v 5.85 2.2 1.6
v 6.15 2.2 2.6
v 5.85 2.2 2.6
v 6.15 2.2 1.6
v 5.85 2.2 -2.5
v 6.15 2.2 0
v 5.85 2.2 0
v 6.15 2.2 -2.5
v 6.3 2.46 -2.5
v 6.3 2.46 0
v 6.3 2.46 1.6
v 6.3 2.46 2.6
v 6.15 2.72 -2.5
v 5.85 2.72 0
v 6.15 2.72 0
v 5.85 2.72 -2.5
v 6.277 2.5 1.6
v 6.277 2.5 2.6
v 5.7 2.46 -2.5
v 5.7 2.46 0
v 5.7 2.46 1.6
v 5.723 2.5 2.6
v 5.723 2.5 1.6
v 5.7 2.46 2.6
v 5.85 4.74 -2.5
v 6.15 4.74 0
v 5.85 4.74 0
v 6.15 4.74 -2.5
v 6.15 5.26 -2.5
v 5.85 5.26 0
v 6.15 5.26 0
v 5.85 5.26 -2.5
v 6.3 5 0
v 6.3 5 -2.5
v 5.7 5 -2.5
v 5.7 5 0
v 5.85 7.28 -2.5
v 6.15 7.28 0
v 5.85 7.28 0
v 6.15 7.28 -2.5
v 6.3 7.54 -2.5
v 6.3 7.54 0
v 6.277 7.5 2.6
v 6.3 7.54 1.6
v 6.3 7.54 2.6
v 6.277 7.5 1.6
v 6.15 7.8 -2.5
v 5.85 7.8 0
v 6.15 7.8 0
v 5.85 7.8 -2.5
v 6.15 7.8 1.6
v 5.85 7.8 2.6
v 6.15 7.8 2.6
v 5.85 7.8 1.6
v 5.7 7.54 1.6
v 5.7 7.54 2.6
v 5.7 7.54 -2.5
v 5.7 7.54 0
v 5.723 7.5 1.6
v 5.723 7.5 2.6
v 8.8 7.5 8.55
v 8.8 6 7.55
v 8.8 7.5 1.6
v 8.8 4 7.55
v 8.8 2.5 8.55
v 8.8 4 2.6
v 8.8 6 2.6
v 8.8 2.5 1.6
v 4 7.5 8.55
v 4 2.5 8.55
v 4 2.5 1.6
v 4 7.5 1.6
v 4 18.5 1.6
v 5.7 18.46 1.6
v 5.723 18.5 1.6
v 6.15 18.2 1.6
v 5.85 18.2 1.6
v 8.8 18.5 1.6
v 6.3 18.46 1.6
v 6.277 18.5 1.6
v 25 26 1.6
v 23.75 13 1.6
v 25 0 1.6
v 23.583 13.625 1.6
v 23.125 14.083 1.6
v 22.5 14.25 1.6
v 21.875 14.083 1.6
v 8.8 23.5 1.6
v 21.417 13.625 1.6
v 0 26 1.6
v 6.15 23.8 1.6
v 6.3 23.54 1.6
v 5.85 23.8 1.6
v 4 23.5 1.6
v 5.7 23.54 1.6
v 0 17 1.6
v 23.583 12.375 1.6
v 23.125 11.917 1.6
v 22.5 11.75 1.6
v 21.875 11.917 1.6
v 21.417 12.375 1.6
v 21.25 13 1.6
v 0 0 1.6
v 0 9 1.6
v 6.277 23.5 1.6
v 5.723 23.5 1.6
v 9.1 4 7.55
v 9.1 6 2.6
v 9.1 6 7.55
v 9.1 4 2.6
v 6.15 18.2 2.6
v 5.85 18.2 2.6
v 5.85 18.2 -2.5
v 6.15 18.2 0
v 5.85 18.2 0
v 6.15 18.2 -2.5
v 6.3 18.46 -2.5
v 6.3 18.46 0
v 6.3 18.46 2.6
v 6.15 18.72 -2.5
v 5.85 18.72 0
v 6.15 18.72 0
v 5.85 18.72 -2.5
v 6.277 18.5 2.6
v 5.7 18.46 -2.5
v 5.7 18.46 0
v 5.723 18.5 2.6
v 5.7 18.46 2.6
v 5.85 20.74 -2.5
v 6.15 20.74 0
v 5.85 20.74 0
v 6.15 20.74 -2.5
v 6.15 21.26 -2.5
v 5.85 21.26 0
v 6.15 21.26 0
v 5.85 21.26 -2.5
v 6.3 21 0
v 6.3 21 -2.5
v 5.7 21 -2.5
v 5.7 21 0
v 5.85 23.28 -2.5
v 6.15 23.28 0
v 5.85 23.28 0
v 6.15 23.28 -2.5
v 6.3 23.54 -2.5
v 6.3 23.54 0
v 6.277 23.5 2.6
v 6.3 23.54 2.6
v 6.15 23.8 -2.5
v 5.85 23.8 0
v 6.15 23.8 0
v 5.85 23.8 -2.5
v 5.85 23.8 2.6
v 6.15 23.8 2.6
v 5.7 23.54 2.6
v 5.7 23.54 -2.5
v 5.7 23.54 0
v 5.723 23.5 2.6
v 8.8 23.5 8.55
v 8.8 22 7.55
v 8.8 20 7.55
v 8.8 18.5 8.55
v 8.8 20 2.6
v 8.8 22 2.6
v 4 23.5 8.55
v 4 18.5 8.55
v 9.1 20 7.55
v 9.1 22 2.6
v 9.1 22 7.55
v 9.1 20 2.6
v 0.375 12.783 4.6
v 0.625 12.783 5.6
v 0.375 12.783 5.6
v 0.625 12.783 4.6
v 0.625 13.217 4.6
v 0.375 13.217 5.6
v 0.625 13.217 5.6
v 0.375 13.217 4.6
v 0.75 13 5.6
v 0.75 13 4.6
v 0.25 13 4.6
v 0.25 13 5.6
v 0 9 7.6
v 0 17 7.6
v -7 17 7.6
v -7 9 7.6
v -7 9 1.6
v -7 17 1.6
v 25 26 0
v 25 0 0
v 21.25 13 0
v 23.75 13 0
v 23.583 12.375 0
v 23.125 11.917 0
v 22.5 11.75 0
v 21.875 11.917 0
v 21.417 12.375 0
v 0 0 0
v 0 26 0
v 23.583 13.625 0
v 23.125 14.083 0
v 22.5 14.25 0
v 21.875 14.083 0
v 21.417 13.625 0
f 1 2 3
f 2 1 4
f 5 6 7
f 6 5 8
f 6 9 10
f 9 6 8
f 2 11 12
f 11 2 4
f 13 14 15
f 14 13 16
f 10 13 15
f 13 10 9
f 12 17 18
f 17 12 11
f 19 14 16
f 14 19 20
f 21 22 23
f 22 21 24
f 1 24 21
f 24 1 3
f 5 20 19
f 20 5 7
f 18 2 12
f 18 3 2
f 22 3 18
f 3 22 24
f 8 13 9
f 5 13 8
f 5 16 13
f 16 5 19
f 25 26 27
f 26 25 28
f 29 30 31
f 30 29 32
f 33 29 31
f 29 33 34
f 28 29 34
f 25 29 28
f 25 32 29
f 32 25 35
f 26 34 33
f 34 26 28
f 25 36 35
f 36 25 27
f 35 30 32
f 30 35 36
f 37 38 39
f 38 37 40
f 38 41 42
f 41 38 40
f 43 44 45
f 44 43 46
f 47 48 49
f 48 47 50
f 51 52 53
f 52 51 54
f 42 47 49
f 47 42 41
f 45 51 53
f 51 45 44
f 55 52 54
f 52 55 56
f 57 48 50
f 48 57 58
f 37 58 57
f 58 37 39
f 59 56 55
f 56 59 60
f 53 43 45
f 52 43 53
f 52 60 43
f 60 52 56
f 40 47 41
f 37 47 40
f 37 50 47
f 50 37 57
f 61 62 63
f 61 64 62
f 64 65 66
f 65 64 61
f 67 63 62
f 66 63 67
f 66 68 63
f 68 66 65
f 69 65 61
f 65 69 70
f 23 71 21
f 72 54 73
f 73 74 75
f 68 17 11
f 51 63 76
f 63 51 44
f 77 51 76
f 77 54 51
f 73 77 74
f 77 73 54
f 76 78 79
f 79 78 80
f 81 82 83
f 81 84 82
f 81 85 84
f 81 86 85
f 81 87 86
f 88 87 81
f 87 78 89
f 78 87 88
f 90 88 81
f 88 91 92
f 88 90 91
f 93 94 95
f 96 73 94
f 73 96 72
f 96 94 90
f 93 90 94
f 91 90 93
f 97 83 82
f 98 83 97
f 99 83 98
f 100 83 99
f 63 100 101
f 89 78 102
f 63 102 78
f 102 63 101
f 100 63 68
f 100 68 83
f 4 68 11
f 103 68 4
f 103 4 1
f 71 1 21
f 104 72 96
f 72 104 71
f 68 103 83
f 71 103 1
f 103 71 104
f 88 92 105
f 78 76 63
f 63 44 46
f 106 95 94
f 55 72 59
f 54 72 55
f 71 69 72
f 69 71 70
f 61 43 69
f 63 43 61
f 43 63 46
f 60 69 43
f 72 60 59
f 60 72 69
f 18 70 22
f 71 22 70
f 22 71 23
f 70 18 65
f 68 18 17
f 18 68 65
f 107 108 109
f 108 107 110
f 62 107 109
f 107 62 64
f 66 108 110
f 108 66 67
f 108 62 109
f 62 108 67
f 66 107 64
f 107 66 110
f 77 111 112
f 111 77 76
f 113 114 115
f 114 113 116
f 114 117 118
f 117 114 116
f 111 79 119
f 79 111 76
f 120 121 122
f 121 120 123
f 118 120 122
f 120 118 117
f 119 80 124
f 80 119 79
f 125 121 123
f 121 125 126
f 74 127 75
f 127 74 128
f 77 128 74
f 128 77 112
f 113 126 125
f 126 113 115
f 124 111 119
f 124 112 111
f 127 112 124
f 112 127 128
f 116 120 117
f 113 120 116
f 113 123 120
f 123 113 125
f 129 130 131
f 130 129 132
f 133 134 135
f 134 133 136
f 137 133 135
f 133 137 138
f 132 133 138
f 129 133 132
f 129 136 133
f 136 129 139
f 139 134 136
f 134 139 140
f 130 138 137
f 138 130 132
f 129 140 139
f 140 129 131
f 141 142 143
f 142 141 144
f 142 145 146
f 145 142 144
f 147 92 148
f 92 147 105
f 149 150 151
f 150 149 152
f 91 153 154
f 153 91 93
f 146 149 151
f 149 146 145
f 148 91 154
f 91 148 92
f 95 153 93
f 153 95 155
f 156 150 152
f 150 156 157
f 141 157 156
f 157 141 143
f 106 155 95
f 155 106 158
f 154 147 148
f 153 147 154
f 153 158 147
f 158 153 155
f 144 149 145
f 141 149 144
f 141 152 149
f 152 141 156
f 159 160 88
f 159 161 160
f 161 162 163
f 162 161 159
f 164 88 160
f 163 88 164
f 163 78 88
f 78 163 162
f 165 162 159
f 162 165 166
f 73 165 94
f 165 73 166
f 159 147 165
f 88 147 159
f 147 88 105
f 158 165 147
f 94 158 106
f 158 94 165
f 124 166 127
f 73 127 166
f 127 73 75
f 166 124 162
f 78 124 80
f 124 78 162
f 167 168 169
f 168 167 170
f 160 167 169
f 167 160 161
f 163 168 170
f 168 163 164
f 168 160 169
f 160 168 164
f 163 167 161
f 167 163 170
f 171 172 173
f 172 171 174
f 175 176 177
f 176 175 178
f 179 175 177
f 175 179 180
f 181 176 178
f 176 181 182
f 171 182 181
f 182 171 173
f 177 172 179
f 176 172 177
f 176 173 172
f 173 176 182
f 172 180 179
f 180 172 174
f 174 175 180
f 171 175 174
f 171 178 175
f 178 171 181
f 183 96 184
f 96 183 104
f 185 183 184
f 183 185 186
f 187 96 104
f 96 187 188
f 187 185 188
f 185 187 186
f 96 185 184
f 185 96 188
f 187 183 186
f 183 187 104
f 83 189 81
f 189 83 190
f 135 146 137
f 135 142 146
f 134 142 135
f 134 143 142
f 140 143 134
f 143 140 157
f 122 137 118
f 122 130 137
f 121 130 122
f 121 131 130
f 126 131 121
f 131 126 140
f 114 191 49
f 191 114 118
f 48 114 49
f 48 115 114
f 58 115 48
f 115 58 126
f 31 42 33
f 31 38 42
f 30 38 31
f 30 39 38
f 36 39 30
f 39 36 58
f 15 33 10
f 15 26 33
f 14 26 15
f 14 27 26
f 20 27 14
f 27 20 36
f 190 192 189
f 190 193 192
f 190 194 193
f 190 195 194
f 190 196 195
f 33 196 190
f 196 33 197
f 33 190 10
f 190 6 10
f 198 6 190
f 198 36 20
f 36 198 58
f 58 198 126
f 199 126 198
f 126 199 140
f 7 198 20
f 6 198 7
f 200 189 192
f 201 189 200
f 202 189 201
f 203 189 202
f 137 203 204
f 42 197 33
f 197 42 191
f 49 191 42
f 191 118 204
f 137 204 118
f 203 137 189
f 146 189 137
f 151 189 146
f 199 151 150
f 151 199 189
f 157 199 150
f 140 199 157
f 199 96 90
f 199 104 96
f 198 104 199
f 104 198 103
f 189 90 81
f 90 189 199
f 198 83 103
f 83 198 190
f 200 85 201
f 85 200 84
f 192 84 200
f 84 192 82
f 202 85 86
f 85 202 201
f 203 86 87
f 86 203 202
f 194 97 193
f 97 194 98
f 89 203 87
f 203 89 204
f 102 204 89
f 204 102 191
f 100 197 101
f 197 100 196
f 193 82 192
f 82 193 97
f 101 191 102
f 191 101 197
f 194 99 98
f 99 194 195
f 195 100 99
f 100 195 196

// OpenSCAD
// Dock Homing Sensor PCB — 2x TSOP38238 IR Receivers
// BOM (upstream BOM.md line 57): "Dock homing sensor | 1 | $3 | Custom PCB |
// 2x TSOP38238 IR receivers"
//
// Function: robot-side receiver board for the final dock-approach/centering
// step. The DOCK board carries an "IR homing beacon" (BOM.md line 81, Dock
// board feature). The robot's TWO TSOP38238 receivers detect that beacon and
// the pair gives lateral (left/right) signal-parity information so the MCU can
// steer the robot onto the charge contacts. This model carries NO IR LED —
// the dock emits, the robot receives. (Function reasoning: (estimate) inferred
// from BOM lines 57 + 81; verify intended firmware use.)
//
// TSOP38238 envelope is (datasheet: Vishay TSOP382/384 datasheet, rev 2.1,
// 27-May-2025, Doc. 82491, fetched 2026-08-15): Minicast package
// "5.0 W x 6.95 H x 4.8 D" mm, leads 2.54 mm nominal pitch, overall length
// with leads 8.25 ± 0.3 mm, pinning 1 = OUT, 2 = GND, 3 = VS, carrier 38 kHz,
// half-angle half transmission distance φ1/2 = ±45 °.
//
// Everything PCB-outline and layout related below is (estimate) — this is a
// custom PCB, not an off-the-shelf module.
//
// Licensed CC0 — use freely.

// ===== PARAMETERS =====

// ---- Custom PCB (estimate, conjectural layout) ----
pcb_l      =  25;   // mm (estimate) board length along boresight (dock-facing edge ⇒ rear edge)
pcb_w      =  26;   // mm (estimate) board width across the robot (cross-axis); sized to
                    //   contain the receiver pair + margins (2 x tsop_w + rx_pitch + edges)
pcb_thick  =   1.6; // mm (estimate) standard FR4, verify with Jig 16 feeler steps

// ---- TSOP38238 (datasheet: Vishay TSOP382/384, Doc 82491, fetched 2026-08-15) ----
tsop_w     =   5.0; // mm (datasheet) package W
tsop_d     =   4.8; // mm (datasheet) package D (depth along boresight)
tsop_h     =   6.95; // mm (datasheet) package H total (leaded Minicast; overall w/ leads 8.25 ± 0.3)
tsop_pins  =   3;   // (datasheet) pinning 1 = OUT, 2 = GND, 3 = VS
tsop_pin_pitch = 2.54; // mm (datasheet) lead pitch "2.54 nom."

// ---- Receiver pair geometry (estimate — THE critical docking dimension) ----
rx_pitch   =  16;   // mm (estimate) center-to-center spacing of the two TSOP38238.
                    // Sets the lateral centering geometry vs. the dock beacon.
                    // Constraints: ≤ dock beacon beam width at approach; ≥ PCB
                    // space for two full packages + leads. MUST be re-derived
                    // from the actual dock/IR design and beam test.
rx_inset   =   4;   // mm (estimate) first receiver center from board front edge

// ---- Mounting / connector (estimate) ----
mtg_dia    =   2.5; // mm (estimate) M2 screw clearance
mtg_inset  =   2.5; // mm (estimate) mount hole center from rear board edge
conn_pins  =   4;   // (estimate) VCC, GND, OUT_beam1, OUT_beam2 (2 receivers share supply)
conn_pitch =   2.0; // mm (estimate) JST PH 2.0 mm or similar
conn_w     =   8;   // mm (estimate) connector shell width
conn_d     =   7;   // mm (estimate) connector shell depth
conn_h     =   6;   // mm (estimate) connector shell height above PCB

$fn = 16;

// ===== MODULES =====

module pcb() {
    color("DarkGreen", 0.85) cube([pcb_l, pcb_w, pcb_thick]);
}

module tsop38238(at_y = 0) {
    // Dash-mounted IR receiver module. Window faces +X (toward the dock).
    color("DimGray") {
        translate([rx_inset, at_y - tsop_w/2, pcb_thick])
            cube([tsop_d, tsop_w, tsop_h]);
        // IR window on the +X (boresight) face, capped on both sides by case
        color("DarkRed", 0.6)
            translate([rx_inset + tsop_d, at_y - 1.0, pcb_thick + 1.0])
                cube([0.3, 2.0, tsop_h - 2.0]);
        // 3 leads (1=OUT,2=GND,3=VS) down through the PCB, 2.54 pitch
        for (i = [0 : tsop_pins - 1]) {
            translate([rx_inset + 2, at_y + (i - 1) * tsop_pin_pitch, -2.5])
                cylinder(h = pcb_thick + 2.5 + 1, d = 0.6, $fn = 6);
        }
    }
}

module connector() {
    // 4-pin JST PH or similar on the rear (-X) edge
    color("White") {
        translate([-conn_d, pcb_w/2 - conn_w/2, pcb_thick])
            cube([conn_d, conn_w, conn_h]);
        for (i = [0 : conn_pins - 1]) {
            translate([-conn_d + 1.5 + i * conn_pitch, pcb_w/2, pcb_thick + conn_h/2])
                cylinder(h = 1, d = 0.5, $fn = 6);
        }
    }
}

module mounting_holes() {
    // 2 rear mount holes (M2) on the board centreline
    for (x = [pcb_l - mtg_inset])
        for (y = [pcb_w/2])
            translate([x, y, -0.1])
                cylinder(h = pcb_thick + 0.2, d = mtg_dia, $fn = 12);
}

module assembly() {
    difference() {
        union() {
            pcb();
            tsop38238( at_y =  pcb_w/2 - rx_pitch/2);
            tsop38238( at_y =  pcb_w/2 + rx_pitch/2);
            connector();
        }
        mounting_holes();
    }
}

// ===== RENDER =====
assembly();

// ===== NOTES =====
// (1) BOM hierarchy: the two TSOP38238 are the ONLY compass co-located with
//     this board (BOM L57). The dock emits a homing beacon (BOM L81); both
//     receivers point +X and are spaced rx_pitch apart so centered access sees
//     equal irradiance and off-center approach creates a left/right imbalance
//     (φ1/2 = ±45° per datasheet gives each receiver a wide acceptance cone —
//     verify actual beacon geometry).
//
// (2) rx_pitch is the single most important number on this board (like
//     contact_pitch on the charging contacts). It sets how precisely the robot
//     can square to the dock. If firmware uses only "beacon seen / not seen",
//     spacing only needs to clear the charge contact pitch (45 mm est) gap so a
//     receiver is always within the beacon cone; if firmware steers on signal
//     parity, wider spacing = sharper centering but a narrower capture window.
//     Re-derive it from the dock IR design, don't trust this 16 mm estimate.
//
// (3) No IR LED on this board — the dock beacon (BOM L81) is the emitter.
//     Screened/ sleeved against ambient light if the beacon is the only gate
//     for parking (datasheet gives automatic AGC suppression of fluorescent
//     lamp noise; still verify in a sunlit room).
//
// (4) This is a placement/clearance draft. The PCB layout (25 mm long x 26 mm
//     wide) is conjectural — fabricate a real board and feed measurements back so the
//     outline/pocket geometry stops being estimate. See MEASURE-ME §18 and
//     Jig 16.
